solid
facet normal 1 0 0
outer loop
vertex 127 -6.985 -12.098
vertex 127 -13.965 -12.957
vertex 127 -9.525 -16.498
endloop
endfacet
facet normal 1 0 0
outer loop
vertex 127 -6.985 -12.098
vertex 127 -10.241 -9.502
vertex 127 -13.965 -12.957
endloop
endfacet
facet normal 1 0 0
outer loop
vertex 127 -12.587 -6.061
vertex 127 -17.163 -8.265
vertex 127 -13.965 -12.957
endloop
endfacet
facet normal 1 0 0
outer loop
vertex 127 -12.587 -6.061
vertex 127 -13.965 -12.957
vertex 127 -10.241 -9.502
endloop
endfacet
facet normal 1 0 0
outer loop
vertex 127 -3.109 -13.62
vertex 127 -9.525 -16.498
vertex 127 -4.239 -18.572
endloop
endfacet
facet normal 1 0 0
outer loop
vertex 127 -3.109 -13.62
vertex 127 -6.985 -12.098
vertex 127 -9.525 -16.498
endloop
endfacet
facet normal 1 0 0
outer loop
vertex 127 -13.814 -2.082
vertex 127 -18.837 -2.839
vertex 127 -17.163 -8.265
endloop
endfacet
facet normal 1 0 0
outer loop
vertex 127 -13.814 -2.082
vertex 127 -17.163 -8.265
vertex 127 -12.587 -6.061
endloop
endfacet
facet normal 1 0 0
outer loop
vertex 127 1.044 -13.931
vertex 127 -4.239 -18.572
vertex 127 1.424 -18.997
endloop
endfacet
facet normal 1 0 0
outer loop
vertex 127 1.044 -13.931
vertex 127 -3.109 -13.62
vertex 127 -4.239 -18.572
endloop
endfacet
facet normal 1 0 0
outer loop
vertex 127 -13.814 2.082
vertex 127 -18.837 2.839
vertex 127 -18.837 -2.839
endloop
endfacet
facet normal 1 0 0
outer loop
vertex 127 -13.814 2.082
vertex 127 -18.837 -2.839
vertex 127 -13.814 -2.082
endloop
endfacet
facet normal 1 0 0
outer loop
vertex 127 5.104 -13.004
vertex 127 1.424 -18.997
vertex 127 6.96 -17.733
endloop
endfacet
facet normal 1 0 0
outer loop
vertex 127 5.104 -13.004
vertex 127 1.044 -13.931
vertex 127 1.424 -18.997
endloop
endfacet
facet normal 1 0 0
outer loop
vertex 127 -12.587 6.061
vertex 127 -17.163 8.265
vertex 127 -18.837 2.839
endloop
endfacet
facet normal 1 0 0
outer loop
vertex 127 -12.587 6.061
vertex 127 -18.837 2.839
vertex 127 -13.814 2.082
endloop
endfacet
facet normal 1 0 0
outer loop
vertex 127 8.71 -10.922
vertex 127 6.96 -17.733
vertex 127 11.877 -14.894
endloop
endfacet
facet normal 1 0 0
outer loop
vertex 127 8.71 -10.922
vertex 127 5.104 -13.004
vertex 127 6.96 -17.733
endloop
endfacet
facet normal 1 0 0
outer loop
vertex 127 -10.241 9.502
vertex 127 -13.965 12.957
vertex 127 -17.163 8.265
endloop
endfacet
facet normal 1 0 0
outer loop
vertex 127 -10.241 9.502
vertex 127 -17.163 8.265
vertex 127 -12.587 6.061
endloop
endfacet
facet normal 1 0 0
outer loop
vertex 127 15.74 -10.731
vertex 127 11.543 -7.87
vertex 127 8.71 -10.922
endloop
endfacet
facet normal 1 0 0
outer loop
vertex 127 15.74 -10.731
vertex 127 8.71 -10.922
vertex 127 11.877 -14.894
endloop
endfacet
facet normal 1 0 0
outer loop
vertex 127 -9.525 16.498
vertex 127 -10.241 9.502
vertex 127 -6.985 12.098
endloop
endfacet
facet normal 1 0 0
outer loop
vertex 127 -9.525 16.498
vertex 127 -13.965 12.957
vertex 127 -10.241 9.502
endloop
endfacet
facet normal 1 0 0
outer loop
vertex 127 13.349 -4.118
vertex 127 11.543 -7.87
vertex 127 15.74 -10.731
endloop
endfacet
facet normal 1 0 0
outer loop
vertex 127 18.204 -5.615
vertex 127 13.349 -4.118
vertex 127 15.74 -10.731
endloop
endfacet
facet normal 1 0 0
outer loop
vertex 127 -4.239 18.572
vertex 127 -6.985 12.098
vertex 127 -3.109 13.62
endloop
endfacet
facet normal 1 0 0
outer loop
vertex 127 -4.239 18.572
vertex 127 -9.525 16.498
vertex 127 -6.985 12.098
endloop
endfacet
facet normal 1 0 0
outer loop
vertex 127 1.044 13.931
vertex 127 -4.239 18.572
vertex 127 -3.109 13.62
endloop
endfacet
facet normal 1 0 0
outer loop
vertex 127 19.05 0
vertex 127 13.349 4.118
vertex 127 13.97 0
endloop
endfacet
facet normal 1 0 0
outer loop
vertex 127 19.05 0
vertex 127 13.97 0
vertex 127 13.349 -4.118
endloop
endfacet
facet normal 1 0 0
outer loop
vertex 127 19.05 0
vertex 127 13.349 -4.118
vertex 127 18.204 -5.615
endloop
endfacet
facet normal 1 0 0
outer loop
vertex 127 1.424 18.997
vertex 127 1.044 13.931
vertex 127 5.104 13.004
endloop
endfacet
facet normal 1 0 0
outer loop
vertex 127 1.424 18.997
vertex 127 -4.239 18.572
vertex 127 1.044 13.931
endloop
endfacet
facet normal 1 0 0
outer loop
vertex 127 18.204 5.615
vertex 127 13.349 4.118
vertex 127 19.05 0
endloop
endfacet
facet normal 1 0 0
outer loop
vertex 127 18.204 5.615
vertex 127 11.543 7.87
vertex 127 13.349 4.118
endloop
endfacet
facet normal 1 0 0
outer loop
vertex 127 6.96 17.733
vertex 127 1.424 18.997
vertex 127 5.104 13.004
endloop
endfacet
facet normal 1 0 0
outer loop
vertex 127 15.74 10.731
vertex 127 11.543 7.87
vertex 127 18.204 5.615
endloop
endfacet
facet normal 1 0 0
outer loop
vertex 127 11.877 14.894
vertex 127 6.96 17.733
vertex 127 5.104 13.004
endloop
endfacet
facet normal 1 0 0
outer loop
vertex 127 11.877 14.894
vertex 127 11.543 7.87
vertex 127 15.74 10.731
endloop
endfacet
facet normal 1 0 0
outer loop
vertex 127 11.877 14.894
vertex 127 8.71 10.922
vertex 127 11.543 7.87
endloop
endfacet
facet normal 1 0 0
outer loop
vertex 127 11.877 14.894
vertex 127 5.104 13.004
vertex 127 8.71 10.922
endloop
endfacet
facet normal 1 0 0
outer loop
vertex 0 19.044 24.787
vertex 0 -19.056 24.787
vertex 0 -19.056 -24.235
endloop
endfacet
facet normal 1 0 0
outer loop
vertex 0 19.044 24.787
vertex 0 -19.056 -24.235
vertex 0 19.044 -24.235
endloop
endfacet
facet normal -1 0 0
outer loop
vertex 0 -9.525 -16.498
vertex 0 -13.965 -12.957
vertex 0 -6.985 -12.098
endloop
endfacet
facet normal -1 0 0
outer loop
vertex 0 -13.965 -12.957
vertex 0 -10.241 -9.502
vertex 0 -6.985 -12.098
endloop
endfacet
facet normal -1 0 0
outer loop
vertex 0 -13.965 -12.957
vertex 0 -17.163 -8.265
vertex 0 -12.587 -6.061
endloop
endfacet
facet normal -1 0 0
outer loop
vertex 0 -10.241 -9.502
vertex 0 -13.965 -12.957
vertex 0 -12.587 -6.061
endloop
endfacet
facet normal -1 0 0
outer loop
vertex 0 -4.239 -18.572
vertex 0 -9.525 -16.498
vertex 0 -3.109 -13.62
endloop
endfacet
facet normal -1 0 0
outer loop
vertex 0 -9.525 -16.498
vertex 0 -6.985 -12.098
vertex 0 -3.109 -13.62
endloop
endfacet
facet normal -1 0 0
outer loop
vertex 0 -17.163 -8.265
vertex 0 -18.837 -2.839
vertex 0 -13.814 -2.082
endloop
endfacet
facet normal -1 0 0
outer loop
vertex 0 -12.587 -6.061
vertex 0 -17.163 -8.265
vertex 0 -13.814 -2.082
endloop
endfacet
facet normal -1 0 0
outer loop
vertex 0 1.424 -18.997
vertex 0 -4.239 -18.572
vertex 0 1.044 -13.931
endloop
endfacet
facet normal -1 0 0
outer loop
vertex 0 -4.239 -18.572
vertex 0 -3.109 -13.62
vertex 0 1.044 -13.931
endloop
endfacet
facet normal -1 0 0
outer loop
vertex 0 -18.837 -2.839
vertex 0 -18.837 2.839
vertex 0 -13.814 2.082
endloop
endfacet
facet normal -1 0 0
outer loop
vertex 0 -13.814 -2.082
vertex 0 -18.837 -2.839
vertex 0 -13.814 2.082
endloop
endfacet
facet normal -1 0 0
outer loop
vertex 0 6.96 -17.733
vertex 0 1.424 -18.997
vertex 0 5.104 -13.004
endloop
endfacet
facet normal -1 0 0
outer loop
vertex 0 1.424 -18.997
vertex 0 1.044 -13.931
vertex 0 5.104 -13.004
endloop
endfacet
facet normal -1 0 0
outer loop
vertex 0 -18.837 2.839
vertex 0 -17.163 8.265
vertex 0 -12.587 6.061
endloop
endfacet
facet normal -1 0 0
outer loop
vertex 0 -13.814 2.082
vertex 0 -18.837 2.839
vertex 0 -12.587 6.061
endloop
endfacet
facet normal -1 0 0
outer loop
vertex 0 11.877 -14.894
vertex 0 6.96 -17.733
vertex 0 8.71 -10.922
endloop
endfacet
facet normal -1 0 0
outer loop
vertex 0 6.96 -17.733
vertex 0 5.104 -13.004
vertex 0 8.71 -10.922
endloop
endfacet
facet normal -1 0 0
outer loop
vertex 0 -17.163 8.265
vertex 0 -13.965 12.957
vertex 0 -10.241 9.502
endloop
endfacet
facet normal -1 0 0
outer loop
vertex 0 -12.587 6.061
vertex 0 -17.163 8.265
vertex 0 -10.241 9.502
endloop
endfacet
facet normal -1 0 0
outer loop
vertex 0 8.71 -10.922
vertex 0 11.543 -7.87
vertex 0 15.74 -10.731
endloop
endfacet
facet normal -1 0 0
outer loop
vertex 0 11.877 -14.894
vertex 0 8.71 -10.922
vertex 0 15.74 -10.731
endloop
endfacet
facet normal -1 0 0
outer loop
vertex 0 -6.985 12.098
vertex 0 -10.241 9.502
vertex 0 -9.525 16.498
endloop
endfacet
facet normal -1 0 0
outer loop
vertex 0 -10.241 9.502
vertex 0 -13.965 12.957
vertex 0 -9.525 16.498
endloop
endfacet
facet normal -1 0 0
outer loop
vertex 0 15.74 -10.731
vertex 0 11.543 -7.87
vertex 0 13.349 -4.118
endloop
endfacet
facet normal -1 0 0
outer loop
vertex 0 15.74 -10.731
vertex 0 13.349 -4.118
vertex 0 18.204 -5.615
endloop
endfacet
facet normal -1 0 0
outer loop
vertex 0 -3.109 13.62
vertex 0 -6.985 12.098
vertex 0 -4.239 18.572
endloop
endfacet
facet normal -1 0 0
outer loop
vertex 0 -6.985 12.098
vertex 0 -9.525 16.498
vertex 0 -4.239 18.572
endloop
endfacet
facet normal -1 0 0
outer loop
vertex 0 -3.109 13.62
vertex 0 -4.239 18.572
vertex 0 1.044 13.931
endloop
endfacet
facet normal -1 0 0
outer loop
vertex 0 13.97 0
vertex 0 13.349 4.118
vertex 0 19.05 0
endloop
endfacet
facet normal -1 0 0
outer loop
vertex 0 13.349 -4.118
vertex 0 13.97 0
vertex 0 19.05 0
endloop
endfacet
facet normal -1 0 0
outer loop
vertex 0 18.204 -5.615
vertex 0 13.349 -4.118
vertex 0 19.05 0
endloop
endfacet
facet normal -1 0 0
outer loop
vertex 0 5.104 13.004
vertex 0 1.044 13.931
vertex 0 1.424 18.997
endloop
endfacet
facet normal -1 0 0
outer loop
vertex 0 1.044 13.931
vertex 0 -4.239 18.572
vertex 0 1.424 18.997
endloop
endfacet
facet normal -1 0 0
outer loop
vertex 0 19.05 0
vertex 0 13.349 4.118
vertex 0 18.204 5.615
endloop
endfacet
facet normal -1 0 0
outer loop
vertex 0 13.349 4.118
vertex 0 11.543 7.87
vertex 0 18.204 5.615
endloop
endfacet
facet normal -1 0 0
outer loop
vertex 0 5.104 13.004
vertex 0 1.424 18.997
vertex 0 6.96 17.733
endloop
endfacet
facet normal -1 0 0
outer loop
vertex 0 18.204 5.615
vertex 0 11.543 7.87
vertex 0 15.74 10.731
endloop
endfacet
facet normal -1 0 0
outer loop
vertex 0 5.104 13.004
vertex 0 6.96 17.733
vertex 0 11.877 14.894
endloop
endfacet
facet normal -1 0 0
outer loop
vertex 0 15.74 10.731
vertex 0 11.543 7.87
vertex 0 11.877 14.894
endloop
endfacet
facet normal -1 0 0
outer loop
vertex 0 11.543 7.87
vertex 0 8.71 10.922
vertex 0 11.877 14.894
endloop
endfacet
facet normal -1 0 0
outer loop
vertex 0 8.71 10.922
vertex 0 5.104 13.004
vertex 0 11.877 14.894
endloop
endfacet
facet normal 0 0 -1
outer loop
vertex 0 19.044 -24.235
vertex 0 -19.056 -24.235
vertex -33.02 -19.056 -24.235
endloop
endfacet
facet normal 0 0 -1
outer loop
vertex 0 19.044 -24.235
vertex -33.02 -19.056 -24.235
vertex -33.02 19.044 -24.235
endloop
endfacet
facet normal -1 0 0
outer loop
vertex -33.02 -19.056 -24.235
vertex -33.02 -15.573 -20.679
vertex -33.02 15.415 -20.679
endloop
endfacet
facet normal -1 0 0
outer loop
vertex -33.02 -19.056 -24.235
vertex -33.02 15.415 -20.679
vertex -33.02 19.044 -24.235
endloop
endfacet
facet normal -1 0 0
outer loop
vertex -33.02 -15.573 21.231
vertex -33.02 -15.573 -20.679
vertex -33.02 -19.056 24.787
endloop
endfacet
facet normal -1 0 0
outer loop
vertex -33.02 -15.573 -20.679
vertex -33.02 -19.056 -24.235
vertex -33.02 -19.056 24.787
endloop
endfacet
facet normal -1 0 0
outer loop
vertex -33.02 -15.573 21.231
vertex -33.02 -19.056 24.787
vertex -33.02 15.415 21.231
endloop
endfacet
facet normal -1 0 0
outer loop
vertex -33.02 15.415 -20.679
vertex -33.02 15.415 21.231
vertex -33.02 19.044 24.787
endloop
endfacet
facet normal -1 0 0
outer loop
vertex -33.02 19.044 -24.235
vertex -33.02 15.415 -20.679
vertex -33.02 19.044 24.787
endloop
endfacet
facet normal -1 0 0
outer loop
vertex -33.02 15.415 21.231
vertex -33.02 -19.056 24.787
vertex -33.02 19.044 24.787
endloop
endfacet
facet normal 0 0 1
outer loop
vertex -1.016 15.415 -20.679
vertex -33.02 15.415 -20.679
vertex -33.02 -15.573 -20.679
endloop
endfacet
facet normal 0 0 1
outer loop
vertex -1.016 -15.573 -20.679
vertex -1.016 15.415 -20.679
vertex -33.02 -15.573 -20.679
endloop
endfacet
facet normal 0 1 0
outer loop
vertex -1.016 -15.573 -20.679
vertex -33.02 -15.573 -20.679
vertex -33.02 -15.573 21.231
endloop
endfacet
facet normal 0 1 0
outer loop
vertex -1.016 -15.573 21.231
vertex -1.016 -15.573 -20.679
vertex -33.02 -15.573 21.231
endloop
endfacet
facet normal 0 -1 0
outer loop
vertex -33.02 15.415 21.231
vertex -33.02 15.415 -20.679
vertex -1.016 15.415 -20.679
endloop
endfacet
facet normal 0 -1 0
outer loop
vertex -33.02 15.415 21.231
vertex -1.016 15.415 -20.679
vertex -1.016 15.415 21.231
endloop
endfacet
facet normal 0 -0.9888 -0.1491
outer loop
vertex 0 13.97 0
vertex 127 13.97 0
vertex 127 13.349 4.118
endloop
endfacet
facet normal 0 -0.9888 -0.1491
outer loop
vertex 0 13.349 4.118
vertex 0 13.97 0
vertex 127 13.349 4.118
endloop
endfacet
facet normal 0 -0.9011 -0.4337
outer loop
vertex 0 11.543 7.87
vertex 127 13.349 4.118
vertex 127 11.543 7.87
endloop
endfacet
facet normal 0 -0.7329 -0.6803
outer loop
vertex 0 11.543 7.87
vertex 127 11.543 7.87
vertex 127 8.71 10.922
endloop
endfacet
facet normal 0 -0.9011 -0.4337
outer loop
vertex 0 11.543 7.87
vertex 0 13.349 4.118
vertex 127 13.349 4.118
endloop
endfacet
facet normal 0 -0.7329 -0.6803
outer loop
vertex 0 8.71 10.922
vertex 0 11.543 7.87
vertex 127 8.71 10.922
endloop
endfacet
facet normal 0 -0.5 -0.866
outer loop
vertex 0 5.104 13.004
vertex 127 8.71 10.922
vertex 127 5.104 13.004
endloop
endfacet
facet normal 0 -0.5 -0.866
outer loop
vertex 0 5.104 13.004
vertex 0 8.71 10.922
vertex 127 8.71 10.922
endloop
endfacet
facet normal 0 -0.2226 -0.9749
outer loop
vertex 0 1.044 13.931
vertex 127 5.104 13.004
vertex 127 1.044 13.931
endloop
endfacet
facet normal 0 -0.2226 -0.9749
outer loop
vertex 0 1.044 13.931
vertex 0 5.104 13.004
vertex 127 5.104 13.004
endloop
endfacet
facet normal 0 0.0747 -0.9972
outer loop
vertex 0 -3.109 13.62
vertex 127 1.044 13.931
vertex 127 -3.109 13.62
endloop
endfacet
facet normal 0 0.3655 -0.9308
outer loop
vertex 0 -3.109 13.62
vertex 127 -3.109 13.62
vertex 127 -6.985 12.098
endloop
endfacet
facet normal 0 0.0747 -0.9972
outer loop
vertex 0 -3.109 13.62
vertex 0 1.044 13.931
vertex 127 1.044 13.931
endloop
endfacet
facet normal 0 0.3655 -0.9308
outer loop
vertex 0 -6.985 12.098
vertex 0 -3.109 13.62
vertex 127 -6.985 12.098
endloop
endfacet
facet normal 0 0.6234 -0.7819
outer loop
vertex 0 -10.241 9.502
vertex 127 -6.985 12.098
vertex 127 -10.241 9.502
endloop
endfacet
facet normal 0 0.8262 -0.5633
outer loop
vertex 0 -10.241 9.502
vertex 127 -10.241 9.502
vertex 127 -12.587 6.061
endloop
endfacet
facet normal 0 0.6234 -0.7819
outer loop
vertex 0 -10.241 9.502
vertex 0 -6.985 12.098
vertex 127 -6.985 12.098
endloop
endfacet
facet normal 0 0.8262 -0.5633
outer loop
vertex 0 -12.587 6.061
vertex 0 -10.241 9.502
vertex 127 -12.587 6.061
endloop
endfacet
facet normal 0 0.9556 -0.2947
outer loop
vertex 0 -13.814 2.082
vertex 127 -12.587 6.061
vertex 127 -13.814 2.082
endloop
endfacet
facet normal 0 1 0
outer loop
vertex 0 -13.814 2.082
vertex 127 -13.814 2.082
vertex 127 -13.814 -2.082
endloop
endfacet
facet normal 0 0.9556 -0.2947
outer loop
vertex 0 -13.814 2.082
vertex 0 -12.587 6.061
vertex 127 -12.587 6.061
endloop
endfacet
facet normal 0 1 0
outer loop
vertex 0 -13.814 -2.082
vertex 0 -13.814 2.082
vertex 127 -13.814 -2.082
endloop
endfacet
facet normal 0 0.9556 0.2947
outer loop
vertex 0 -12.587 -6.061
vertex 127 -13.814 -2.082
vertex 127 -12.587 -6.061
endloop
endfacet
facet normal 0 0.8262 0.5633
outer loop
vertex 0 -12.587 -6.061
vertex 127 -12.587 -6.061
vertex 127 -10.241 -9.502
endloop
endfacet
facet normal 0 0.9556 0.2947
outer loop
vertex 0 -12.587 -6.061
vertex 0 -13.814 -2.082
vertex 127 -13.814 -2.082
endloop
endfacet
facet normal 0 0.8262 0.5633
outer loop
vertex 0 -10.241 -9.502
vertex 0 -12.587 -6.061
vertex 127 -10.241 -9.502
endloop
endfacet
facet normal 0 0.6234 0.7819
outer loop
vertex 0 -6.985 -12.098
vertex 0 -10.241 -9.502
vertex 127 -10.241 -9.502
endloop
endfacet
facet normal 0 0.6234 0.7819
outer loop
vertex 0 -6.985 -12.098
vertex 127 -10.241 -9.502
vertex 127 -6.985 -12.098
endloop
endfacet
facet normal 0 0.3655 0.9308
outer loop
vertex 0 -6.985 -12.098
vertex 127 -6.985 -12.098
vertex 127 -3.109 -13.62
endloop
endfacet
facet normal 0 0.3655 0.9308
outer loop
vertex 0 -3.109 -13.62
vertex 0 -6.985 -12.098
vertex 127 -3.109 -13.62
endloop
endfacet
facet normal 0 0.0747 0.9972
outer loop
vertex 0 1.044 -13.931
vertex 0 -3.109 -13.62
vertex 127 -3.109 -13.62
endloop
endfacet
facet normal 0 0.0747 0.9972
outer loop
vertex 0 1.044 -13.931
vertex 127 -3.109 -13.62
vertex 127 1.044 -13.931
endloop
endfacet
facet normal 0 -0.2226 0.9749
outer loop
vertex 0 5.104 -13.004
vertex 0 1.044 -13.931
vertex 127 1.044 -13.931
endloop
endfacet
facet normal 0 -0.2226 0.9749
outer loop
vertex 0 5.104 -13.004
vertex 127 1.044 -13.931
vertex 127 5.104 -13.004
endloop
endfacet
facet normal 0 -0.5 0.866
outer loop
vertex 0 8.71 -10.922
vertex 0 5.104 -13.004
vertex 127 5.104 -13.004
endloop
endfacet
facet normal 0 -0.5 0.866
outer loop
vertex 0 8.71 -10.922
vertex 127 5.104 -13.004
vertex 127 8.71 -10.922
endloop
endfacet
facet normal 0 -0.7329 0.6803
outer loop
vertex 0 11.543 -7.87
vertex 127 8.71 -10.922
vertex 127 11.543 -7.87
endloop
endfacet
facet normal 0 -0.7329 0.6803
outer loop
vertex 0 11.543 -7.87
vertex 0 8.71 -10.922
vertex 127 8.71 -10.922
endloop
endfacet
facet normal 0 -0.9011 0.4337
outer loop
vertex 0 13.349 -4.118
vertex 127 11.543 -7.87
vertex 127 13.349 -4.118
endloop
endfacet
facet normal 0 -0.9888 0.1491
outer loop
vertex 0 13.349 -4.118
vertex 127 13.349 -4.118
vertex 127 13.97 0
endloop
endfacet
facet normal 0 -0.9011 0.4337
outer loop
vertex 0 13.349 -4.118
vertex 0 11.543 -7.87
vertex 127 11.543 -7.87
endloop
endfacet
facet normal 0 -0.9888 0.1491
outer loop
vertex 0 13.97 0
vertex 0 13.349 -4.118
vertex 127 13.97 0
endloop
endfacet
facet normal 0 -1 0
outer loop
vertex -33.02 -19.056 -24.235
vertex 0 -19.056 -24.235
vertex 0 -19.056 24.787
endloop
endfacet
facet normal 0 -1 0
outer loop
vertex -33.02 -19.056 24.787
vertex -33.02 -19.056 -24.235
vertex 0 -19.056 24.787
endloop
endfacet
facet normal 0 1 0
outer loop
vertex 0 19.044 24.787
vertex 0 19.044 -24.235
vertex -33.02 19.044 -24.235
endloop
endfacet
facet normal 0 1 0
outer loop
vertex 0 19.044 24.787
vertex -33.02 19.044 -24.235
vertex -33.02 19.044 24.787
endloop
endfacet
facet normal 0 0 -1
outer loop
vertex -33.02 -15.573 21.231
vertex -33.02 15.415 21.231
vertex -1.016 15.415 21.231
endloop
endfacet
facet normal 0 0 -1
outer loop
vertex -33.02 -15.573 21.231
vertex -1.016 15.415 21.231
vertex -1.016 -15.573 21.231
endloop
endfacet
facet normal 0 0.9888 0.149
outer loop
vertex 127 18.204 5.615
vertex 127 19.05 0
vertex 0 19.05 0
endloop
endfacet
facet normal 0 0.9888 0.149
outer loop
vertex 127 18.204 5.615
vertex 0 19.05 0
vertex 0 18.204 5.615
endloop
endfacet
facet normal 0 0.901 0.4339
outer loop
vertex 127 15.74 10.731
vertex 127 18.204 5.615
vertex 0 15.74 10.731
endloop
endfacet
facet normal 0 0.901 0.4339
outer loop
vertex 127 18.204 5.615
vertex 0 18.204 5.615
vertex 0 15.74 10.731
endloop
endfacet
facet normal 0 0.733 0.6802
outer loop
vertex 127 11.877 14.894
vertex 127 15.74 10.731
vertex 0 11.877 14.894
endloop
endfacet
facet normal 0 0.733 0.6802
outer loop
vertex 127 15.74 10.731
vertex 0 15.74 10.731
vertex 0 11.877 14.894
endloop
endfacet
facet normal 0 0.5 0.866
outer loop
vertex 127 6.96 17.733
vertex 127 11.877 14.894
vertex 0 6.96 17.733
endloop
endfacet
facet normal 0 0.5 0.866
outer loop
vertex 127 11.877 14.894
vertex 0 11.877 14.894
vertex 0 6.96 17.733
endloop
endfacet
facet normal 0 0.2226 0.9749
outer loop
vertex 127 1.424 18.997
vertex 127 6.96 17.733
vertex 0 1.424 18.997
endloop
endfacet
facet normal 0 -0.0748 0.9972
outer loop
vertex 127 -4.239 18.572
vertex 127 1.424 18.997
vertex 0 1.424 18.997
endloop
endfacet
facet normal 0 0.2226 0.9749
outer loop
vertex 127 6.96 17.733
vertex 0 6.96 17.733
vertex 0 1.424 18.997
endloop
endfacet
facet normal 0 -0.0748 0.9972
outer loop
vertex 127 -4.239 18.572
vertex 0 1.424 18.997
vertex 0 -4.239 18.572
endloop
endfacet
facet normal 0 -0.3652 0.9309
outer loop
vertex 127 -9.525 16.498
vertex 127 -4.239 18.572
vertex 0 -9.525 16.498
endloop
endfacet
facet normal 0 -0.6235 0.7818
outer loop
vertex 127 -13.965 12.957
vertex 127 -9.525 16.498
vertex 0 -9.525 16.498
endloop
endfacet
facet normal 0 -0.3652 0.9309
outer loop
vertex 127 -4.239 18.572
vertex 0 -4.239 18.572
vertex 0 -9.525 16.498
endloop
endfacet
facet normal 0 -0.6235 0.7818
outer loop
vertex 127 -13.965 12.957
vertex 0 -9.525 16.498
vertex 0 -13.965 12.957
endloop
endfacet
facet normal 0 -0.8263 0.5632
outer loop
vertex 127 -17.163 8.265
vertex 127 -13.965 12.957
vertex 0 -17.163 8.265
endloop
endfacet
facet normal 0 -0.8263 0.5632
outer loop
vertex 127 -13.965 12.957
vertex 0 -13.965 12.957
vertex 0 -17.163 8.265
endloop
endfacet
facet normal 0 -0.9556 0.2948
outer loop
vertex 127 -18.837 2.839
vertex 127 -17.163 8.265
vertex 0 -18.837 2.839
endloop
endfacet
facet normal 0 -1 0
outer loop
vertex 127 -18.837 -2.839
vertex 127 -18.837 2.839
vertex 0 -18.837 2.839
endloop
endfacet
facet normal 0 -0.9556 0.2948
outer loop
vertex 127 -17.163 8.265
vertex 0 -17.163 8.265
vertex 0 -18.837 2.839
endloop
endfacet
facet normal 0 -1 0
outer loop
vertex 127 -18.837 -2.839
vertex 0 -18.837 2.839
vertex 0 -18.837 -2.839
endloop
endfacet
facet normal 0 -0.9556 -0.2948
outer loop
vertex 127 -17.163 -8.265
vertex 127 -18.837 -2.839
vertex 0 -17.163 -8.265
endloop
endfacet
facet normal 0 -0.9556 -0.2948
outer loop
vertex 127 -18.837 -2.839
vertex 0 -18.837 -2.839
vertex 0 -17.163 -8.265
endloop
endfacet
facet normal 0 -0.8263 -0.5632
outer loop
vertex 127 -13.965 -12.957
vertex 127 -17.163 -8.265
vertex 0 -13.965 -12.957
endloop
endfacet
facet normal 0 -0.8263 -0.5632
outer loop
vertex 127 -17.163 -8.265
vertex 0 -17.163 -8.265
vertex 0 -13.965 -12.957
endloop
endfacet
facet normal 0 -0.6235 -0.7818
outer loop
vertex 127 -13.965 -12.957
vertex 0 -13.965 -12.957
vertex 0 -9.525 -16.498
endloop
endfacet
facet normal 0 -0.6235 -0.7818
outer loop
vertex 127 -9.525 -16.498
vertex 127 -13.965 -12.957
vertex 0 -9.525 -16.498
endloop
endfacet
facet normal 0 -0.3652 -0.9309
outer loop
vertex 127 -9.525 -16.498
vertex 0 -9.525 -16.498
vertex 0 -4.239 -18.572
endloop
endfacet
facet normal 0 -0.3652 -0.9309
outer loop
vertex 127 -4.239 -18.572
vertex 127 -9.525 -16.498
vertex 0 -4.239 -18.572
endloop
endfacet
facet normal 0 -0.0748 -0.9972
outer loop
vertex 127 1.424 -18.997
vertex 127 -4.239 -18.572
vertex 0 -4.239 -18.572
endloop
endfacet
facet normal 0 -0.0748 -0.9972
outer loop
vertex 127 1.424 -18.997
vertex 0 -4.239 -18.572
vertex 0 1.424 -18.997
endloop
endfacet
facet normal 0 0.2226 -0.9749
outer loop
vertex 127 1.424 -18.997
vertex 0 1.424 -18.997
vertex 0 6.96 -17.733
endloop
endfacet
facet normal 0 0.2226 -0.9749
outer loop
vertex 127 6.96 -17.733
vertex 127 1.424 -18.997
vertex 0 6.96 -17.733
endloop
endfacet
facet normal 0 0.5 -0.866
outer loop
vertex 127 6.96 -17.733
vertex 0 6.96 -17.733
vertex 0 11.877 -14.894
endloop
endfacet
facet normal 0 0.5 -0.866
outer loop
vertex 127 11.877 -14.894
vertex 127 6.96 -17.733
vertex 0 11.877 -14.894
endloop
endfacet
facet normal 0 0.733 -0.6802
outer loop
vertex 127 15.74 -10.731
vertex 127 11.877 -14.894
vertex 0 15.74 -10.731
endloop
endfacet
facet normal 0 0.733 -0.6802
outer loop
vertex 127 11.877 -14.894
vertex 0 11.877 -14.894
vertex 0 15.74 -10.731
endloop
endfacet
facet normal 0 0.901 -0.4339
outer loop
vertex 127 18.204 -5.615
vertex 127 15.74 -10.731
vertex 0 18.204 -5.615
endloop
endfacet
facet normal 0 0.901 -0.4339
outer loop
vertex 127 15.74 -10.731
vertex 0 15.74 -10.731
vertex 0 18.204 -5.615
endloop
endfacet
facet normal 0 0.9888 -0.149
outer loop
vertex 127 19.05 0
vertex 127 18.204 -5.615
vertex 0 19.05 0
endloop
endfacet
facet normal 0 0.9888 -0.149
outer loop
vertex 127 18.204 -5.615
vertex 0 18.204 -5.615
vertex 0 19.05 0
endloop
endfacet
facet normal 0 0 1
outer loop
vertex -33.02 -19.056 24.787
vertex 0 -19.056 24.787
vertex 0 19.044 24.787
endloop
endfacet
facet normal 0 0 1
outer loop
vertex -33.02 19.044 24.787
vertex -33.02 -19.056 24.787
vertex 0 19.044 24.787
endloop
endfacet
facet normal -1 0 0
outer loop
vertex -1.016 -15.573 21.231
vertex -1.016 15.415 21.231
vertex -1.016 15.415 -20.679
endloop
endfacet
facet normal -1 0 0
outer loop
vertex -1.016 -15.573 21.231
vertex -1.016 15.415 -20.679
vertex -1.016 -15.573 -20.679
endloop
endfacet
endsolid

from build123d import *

# Parameters (mm, degrees)
F0_R     = 19.05
F0_R_2   = 13.97
F1_DEPTH = 127
F2_W     = 38.0999972801
F2_H     = 49.0219972801
F2_W_2   = 30.988
F2_H_2   = 41.91
F3_DEPTH = 33.02
F8_W     = 30.988
F8_H     = 41.91
F9_DEPTH = 32.004


# Not quite as in the source:
# - the program builds the solid bodies; features that only make, move or delete a surface that nothing else refers to are left out


with BuildPart() as f1:
    # F0 (on Right) → F1 (new body)
    with BuildSketch(Plane.YZ):
        Circle(F0_R)
        Circle(F0_R_2, mode=Mode.SUBTRACT)
    extrude(amount=F1_DEPTH)


with BuildPart() as f3:
    # F2 (on Right) → F3 (new body)
    with BuildSketch(Plane.YZ):
        with Locations((-0.0063063291, 0.2760496718)):
            Rectangle(F2_W, F2_H)
        with Locations((-0.0063063291, 0.2760496718)):
            Rectangle(F2_W_2, F2_H_2, mode=Mode.SUBTRACT)
        with Locations((-0.0063063291, 0.2760496718)):
            Rectangle(F2_W_2, F2_H_2)
    extrude(amount=-F3_DEPTH)

    # F8 (on face) → F9 (cut)
    with BuildSketch(Plane(origin=(-33.02, 0, 0), x_dir=(0, -1, 0), z_dir=(-1, 0, 0))):
        with Locations((0.0792781701, 0.2760499603)):
            Rectangle(F8_W, F8_H)
    extrude(amount=-F9_DEPTH, mode=Mode.SUBTRACT)


solid = Compound([f1.part, f3.part])
